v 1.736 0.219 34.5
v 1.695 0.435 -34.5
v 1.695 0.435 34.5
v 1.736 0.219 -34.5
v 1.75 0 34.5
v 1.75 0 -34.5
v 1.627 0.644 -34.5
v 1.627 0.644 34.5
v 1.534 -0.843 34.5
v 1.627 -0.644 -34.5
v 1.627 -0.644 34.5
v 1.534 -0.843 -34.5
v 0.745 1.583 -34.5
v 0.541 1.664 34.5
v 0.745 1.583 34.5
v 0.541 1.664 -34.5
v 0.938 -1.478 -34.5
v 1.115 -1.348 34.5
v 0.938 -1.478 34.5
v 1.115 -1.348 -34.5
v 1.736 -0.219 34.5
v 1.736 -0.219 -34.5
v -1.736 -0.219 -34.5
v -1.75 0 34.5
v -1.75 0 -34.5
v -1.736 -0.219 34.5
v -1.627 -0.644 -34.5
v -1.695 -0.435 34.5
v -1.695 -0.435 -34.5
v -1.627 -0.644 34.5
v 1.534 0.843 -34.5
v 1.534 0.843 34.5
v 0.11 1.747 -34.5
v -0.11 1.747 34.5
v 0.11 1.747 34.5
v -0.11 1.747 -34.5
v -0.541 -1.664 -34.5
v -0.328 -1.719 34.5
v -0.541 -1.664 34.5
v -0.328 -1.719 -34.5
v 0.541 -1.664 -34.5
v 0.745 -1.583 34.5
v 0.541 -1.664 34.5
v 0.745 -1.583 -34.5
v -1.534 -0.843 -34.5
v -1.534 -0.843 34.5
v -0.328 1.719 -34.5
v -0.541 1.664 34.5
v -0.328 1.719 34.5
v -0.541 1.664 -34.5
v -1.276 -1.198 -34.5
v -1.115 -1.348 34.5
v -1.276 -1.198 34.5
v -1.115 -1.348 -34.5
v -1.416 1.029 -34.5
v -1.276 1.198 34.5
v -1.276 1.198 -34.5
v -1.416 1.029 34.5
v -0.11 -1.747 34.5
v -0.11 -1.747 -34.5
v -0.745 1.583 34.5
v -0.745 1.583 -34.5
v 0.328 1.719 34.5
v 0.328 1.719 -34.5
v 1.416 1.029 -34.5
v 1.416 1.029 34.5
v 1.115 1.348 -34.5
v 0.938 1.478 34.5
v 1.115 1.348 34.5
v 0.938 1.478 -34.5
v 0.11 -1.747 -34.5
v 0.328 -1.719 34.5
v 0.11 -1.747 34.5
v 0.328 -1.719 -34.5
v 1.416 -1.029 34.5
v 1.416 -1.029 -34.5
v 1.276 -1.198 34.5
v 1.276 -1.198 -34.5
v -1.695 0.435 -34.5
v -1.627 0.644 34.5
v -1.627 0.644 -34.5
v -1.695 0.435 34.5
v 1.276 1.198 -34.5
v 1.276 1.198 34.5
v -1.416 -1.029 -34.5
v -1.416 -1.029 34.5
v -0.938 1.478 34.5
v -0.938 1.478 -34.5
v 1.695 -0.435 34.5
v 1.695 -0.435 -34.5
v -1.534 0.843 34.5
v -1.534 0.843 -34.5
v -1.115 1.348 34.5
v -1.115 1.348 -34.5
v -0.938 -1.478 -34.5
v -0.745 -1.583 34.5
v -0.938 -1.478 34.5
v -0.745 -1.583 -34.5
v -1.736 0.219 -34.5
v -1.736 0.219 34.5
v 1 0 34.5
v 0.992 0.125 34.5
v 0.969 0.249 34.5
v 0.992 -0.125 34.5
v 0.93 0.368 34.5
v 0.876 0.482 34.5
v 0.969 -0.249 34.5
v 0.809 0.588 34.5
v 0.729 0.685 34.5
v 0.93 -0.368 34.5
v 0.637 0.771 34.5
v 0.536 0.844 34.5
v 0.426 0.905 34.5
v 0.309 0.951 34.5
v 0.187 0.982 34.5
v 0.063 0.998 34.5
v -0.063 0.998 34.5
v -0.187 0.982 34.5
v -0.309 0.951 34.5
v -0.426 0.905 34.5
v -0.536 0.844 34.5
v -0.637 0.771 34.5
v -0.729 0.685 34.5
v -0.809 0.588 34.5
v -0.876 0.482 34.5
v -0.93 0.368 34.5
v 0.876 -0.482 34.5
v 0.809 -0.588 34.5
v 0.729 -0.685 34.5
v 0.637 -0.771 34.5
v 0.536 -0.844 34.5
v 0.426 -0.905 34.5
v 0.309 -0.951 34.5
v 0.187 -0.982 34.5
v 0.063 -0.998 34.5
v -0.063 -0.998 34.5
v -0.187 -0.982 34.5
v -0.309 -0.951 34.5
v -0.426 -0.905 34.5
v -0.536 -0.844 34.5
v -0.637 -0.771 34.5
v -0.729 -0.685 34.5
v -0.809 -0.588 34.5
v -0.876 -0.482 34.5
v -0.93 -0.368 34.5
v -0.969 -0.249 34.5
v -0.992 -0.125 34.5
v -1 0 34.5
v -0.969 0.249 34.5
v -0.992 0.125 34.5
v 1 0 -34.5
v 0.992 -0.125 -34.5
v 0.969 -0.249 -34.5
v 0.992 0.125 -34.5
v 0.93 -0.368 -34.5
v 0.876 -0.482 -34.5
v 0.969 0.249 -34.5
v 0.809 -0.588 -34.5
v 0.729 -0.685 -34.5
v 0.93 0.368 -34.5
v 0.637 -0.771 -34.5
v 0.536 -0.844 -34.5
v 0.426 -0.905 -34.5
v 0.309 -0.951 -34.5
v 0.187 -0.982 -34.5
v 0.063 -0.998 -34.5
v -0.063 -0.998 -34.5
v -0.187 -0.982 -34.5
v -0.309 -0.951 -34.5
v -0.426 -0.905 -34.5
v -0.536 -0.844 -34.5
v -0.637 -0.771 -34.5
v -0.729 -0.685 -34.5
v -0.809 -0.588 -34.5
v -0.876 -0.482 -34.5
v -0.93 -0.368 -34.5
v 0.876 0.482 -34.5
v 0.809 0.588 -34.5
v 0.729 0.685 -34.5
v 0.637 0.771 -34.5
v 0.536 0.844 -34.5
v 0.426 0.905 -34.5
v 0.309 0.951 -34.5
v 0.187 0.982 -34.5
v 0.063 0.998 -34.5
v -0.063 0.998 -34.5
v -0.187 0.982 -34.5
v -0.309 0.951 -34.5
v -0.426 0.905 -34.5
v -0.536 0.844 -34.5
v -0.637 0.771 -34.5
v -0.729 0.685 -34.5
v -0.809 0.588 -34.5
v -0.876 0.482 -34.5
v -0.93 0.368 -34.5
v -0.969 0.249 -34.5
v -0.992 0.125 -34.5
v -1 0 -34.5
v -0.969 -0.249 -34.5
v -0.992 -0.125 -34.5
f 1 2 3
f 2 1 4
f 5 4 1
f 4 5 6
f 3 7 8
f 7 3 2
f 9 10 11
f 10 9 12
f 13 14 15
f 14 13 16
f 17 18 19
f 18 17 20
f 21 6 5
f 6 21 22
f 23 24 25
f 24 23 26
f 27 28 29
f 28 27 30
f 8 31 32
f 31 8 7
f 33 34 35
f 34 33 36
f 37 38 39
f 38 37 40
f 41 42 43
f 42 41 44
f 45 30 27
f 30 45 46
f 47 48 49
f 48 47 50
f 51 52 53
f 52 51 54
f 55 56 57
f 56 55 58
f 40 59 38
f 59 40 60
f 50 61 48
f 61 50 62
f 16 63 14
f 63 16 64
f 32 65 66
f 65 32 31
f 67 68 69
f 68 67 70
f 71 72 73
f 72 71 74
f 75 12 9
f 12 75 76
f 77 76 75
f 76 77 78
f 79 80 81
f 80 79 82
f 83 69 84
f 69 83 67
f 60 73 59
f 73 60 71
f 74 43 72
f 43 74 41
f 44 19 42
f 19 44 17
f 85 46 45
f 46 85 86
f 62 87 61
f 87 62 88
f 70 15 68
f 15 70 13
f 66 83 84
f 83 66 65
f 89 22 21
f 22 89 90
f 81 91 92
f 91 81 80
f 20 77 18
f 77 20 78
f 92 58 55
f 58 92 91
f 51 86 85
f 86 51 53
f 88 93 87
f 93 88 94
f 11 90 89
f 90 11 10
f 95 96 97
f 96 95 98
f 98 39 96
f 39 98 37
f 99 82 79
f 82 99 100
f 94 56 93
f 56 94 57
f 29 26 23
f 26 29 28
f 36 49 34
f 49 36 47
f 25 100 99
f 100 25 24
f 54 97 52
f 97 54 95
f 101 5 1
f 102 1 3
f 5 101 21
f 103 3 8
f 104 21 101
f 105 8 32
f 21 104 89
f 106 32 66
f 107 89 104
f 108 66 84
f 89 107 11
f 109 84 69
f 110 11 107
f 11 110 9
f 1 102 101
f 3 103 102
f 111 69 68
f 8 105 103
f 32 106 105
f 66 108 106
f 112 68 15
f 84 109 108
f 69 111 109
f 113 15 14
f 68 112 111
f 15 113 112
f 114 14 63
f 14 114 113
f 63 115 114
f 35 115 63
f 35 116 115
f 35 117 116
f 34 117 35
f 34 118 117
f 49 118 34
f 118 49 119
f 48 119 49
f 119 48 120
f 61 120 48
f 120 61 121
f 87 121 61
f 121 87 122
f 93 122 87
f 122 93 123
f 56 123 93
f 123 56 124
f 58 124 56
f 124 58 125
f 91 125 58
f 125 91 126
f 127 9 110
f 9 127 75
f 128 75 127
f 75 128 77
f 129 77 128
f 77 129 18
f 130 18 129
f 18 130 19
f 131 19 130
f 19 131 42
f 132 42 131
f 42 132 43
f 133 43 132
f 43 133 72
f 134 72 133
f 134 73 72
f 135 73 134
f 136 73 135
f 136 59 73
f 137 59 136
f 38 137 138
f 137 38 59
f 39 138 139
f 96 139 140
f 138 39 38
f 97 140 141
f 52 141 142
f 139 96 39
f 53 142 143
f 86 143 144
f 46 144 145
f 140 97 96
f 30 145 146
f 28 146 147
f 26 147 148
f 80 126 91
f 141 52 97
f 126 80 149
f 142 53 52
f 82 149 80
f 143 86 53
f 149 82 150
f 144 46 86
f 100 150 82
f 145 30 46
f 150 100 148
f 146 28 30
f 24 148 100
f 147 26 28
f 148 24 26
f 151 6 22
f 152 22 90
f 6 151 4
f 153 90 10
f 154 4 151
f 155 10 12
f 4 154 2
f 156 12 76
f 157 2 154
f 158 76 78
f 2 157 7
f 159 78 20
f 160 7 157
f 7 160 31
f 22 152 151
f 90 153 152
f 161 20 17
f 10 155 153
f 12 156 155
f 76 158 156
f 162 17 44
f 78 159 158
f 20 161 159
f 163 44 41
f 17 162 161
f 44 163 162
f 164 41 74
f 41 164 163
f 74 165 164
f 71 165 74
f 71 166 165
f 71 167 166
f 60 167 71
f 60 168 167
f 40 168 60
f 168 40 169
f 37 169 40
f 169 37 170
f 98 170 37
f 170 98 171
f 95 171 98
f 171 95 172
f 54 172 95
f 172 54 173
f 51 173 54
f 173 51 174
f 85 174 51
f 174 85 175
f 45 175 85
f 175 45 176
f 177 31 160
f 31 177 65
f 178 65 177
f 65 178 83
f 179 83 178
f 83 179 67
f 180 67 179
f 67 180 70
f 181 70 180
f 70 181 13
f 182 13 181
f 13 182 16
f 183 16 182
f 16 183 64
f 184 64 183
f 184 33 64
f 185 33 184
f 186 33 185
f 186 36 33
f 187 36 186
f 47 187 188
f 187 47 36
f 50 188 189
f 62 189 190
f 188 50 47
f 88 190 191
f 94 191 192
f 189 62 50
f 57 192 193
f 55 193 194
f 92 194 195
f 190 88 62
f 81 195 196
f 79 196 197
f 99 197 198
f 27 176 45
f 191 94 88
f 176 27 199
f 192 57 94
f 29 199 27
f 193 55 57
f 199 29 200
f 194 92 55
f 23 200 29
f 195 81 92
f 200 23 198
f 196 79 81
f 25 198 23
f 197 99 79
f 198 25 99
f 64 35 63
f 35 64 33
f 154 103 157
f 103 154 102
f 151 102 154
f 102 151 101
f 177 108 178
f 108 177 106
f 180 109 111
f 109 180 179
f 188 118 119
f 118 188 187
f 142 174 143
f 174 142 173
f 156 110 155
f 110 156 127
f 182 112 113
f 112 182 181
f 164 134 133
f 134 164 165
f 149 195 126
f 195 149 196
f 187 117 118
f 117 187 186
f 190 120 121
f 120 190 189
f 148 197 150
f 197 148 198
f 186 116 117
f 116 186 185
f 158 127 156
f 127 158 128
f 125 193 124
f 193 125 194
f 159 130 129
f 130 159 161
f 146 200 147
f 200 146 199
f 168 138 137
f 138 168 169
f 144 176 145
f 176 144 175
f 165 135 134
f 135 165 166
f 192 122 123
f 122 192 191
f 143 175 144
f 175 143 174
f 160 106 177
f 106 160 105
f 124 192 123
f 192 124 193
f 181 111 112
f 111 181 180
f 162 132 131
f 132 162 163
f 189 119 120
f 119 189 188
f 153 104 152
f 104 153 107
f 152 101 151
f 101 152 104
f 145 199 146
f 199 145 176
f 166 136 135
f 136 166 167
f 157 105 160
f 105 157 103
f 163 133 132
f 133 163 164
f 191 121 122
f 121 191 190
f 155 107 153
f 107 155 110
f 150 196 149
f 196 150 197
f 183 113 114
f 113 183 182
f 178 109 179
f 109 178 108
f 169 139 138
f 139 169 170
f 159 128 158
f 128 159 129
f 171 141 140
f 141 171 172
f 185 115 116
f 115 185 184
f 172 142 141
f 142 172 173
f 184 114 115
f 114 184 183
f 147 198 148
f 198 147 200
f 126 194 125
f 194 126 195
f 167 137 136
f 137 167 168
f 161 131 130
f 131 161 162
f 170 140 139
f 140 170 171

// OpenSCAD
$fn = 50;


difference() {
	union() {
		translate(v = [0, 0, -34.5000000000]) {
			cylinder(h = 69, r = 1.7500000000);
		}
	}
	union() {
		translate(v = [0, 0, -100.0000000000]) {
			cylinder(h = 200, r = 1.0000000000);
		}
	}
}
